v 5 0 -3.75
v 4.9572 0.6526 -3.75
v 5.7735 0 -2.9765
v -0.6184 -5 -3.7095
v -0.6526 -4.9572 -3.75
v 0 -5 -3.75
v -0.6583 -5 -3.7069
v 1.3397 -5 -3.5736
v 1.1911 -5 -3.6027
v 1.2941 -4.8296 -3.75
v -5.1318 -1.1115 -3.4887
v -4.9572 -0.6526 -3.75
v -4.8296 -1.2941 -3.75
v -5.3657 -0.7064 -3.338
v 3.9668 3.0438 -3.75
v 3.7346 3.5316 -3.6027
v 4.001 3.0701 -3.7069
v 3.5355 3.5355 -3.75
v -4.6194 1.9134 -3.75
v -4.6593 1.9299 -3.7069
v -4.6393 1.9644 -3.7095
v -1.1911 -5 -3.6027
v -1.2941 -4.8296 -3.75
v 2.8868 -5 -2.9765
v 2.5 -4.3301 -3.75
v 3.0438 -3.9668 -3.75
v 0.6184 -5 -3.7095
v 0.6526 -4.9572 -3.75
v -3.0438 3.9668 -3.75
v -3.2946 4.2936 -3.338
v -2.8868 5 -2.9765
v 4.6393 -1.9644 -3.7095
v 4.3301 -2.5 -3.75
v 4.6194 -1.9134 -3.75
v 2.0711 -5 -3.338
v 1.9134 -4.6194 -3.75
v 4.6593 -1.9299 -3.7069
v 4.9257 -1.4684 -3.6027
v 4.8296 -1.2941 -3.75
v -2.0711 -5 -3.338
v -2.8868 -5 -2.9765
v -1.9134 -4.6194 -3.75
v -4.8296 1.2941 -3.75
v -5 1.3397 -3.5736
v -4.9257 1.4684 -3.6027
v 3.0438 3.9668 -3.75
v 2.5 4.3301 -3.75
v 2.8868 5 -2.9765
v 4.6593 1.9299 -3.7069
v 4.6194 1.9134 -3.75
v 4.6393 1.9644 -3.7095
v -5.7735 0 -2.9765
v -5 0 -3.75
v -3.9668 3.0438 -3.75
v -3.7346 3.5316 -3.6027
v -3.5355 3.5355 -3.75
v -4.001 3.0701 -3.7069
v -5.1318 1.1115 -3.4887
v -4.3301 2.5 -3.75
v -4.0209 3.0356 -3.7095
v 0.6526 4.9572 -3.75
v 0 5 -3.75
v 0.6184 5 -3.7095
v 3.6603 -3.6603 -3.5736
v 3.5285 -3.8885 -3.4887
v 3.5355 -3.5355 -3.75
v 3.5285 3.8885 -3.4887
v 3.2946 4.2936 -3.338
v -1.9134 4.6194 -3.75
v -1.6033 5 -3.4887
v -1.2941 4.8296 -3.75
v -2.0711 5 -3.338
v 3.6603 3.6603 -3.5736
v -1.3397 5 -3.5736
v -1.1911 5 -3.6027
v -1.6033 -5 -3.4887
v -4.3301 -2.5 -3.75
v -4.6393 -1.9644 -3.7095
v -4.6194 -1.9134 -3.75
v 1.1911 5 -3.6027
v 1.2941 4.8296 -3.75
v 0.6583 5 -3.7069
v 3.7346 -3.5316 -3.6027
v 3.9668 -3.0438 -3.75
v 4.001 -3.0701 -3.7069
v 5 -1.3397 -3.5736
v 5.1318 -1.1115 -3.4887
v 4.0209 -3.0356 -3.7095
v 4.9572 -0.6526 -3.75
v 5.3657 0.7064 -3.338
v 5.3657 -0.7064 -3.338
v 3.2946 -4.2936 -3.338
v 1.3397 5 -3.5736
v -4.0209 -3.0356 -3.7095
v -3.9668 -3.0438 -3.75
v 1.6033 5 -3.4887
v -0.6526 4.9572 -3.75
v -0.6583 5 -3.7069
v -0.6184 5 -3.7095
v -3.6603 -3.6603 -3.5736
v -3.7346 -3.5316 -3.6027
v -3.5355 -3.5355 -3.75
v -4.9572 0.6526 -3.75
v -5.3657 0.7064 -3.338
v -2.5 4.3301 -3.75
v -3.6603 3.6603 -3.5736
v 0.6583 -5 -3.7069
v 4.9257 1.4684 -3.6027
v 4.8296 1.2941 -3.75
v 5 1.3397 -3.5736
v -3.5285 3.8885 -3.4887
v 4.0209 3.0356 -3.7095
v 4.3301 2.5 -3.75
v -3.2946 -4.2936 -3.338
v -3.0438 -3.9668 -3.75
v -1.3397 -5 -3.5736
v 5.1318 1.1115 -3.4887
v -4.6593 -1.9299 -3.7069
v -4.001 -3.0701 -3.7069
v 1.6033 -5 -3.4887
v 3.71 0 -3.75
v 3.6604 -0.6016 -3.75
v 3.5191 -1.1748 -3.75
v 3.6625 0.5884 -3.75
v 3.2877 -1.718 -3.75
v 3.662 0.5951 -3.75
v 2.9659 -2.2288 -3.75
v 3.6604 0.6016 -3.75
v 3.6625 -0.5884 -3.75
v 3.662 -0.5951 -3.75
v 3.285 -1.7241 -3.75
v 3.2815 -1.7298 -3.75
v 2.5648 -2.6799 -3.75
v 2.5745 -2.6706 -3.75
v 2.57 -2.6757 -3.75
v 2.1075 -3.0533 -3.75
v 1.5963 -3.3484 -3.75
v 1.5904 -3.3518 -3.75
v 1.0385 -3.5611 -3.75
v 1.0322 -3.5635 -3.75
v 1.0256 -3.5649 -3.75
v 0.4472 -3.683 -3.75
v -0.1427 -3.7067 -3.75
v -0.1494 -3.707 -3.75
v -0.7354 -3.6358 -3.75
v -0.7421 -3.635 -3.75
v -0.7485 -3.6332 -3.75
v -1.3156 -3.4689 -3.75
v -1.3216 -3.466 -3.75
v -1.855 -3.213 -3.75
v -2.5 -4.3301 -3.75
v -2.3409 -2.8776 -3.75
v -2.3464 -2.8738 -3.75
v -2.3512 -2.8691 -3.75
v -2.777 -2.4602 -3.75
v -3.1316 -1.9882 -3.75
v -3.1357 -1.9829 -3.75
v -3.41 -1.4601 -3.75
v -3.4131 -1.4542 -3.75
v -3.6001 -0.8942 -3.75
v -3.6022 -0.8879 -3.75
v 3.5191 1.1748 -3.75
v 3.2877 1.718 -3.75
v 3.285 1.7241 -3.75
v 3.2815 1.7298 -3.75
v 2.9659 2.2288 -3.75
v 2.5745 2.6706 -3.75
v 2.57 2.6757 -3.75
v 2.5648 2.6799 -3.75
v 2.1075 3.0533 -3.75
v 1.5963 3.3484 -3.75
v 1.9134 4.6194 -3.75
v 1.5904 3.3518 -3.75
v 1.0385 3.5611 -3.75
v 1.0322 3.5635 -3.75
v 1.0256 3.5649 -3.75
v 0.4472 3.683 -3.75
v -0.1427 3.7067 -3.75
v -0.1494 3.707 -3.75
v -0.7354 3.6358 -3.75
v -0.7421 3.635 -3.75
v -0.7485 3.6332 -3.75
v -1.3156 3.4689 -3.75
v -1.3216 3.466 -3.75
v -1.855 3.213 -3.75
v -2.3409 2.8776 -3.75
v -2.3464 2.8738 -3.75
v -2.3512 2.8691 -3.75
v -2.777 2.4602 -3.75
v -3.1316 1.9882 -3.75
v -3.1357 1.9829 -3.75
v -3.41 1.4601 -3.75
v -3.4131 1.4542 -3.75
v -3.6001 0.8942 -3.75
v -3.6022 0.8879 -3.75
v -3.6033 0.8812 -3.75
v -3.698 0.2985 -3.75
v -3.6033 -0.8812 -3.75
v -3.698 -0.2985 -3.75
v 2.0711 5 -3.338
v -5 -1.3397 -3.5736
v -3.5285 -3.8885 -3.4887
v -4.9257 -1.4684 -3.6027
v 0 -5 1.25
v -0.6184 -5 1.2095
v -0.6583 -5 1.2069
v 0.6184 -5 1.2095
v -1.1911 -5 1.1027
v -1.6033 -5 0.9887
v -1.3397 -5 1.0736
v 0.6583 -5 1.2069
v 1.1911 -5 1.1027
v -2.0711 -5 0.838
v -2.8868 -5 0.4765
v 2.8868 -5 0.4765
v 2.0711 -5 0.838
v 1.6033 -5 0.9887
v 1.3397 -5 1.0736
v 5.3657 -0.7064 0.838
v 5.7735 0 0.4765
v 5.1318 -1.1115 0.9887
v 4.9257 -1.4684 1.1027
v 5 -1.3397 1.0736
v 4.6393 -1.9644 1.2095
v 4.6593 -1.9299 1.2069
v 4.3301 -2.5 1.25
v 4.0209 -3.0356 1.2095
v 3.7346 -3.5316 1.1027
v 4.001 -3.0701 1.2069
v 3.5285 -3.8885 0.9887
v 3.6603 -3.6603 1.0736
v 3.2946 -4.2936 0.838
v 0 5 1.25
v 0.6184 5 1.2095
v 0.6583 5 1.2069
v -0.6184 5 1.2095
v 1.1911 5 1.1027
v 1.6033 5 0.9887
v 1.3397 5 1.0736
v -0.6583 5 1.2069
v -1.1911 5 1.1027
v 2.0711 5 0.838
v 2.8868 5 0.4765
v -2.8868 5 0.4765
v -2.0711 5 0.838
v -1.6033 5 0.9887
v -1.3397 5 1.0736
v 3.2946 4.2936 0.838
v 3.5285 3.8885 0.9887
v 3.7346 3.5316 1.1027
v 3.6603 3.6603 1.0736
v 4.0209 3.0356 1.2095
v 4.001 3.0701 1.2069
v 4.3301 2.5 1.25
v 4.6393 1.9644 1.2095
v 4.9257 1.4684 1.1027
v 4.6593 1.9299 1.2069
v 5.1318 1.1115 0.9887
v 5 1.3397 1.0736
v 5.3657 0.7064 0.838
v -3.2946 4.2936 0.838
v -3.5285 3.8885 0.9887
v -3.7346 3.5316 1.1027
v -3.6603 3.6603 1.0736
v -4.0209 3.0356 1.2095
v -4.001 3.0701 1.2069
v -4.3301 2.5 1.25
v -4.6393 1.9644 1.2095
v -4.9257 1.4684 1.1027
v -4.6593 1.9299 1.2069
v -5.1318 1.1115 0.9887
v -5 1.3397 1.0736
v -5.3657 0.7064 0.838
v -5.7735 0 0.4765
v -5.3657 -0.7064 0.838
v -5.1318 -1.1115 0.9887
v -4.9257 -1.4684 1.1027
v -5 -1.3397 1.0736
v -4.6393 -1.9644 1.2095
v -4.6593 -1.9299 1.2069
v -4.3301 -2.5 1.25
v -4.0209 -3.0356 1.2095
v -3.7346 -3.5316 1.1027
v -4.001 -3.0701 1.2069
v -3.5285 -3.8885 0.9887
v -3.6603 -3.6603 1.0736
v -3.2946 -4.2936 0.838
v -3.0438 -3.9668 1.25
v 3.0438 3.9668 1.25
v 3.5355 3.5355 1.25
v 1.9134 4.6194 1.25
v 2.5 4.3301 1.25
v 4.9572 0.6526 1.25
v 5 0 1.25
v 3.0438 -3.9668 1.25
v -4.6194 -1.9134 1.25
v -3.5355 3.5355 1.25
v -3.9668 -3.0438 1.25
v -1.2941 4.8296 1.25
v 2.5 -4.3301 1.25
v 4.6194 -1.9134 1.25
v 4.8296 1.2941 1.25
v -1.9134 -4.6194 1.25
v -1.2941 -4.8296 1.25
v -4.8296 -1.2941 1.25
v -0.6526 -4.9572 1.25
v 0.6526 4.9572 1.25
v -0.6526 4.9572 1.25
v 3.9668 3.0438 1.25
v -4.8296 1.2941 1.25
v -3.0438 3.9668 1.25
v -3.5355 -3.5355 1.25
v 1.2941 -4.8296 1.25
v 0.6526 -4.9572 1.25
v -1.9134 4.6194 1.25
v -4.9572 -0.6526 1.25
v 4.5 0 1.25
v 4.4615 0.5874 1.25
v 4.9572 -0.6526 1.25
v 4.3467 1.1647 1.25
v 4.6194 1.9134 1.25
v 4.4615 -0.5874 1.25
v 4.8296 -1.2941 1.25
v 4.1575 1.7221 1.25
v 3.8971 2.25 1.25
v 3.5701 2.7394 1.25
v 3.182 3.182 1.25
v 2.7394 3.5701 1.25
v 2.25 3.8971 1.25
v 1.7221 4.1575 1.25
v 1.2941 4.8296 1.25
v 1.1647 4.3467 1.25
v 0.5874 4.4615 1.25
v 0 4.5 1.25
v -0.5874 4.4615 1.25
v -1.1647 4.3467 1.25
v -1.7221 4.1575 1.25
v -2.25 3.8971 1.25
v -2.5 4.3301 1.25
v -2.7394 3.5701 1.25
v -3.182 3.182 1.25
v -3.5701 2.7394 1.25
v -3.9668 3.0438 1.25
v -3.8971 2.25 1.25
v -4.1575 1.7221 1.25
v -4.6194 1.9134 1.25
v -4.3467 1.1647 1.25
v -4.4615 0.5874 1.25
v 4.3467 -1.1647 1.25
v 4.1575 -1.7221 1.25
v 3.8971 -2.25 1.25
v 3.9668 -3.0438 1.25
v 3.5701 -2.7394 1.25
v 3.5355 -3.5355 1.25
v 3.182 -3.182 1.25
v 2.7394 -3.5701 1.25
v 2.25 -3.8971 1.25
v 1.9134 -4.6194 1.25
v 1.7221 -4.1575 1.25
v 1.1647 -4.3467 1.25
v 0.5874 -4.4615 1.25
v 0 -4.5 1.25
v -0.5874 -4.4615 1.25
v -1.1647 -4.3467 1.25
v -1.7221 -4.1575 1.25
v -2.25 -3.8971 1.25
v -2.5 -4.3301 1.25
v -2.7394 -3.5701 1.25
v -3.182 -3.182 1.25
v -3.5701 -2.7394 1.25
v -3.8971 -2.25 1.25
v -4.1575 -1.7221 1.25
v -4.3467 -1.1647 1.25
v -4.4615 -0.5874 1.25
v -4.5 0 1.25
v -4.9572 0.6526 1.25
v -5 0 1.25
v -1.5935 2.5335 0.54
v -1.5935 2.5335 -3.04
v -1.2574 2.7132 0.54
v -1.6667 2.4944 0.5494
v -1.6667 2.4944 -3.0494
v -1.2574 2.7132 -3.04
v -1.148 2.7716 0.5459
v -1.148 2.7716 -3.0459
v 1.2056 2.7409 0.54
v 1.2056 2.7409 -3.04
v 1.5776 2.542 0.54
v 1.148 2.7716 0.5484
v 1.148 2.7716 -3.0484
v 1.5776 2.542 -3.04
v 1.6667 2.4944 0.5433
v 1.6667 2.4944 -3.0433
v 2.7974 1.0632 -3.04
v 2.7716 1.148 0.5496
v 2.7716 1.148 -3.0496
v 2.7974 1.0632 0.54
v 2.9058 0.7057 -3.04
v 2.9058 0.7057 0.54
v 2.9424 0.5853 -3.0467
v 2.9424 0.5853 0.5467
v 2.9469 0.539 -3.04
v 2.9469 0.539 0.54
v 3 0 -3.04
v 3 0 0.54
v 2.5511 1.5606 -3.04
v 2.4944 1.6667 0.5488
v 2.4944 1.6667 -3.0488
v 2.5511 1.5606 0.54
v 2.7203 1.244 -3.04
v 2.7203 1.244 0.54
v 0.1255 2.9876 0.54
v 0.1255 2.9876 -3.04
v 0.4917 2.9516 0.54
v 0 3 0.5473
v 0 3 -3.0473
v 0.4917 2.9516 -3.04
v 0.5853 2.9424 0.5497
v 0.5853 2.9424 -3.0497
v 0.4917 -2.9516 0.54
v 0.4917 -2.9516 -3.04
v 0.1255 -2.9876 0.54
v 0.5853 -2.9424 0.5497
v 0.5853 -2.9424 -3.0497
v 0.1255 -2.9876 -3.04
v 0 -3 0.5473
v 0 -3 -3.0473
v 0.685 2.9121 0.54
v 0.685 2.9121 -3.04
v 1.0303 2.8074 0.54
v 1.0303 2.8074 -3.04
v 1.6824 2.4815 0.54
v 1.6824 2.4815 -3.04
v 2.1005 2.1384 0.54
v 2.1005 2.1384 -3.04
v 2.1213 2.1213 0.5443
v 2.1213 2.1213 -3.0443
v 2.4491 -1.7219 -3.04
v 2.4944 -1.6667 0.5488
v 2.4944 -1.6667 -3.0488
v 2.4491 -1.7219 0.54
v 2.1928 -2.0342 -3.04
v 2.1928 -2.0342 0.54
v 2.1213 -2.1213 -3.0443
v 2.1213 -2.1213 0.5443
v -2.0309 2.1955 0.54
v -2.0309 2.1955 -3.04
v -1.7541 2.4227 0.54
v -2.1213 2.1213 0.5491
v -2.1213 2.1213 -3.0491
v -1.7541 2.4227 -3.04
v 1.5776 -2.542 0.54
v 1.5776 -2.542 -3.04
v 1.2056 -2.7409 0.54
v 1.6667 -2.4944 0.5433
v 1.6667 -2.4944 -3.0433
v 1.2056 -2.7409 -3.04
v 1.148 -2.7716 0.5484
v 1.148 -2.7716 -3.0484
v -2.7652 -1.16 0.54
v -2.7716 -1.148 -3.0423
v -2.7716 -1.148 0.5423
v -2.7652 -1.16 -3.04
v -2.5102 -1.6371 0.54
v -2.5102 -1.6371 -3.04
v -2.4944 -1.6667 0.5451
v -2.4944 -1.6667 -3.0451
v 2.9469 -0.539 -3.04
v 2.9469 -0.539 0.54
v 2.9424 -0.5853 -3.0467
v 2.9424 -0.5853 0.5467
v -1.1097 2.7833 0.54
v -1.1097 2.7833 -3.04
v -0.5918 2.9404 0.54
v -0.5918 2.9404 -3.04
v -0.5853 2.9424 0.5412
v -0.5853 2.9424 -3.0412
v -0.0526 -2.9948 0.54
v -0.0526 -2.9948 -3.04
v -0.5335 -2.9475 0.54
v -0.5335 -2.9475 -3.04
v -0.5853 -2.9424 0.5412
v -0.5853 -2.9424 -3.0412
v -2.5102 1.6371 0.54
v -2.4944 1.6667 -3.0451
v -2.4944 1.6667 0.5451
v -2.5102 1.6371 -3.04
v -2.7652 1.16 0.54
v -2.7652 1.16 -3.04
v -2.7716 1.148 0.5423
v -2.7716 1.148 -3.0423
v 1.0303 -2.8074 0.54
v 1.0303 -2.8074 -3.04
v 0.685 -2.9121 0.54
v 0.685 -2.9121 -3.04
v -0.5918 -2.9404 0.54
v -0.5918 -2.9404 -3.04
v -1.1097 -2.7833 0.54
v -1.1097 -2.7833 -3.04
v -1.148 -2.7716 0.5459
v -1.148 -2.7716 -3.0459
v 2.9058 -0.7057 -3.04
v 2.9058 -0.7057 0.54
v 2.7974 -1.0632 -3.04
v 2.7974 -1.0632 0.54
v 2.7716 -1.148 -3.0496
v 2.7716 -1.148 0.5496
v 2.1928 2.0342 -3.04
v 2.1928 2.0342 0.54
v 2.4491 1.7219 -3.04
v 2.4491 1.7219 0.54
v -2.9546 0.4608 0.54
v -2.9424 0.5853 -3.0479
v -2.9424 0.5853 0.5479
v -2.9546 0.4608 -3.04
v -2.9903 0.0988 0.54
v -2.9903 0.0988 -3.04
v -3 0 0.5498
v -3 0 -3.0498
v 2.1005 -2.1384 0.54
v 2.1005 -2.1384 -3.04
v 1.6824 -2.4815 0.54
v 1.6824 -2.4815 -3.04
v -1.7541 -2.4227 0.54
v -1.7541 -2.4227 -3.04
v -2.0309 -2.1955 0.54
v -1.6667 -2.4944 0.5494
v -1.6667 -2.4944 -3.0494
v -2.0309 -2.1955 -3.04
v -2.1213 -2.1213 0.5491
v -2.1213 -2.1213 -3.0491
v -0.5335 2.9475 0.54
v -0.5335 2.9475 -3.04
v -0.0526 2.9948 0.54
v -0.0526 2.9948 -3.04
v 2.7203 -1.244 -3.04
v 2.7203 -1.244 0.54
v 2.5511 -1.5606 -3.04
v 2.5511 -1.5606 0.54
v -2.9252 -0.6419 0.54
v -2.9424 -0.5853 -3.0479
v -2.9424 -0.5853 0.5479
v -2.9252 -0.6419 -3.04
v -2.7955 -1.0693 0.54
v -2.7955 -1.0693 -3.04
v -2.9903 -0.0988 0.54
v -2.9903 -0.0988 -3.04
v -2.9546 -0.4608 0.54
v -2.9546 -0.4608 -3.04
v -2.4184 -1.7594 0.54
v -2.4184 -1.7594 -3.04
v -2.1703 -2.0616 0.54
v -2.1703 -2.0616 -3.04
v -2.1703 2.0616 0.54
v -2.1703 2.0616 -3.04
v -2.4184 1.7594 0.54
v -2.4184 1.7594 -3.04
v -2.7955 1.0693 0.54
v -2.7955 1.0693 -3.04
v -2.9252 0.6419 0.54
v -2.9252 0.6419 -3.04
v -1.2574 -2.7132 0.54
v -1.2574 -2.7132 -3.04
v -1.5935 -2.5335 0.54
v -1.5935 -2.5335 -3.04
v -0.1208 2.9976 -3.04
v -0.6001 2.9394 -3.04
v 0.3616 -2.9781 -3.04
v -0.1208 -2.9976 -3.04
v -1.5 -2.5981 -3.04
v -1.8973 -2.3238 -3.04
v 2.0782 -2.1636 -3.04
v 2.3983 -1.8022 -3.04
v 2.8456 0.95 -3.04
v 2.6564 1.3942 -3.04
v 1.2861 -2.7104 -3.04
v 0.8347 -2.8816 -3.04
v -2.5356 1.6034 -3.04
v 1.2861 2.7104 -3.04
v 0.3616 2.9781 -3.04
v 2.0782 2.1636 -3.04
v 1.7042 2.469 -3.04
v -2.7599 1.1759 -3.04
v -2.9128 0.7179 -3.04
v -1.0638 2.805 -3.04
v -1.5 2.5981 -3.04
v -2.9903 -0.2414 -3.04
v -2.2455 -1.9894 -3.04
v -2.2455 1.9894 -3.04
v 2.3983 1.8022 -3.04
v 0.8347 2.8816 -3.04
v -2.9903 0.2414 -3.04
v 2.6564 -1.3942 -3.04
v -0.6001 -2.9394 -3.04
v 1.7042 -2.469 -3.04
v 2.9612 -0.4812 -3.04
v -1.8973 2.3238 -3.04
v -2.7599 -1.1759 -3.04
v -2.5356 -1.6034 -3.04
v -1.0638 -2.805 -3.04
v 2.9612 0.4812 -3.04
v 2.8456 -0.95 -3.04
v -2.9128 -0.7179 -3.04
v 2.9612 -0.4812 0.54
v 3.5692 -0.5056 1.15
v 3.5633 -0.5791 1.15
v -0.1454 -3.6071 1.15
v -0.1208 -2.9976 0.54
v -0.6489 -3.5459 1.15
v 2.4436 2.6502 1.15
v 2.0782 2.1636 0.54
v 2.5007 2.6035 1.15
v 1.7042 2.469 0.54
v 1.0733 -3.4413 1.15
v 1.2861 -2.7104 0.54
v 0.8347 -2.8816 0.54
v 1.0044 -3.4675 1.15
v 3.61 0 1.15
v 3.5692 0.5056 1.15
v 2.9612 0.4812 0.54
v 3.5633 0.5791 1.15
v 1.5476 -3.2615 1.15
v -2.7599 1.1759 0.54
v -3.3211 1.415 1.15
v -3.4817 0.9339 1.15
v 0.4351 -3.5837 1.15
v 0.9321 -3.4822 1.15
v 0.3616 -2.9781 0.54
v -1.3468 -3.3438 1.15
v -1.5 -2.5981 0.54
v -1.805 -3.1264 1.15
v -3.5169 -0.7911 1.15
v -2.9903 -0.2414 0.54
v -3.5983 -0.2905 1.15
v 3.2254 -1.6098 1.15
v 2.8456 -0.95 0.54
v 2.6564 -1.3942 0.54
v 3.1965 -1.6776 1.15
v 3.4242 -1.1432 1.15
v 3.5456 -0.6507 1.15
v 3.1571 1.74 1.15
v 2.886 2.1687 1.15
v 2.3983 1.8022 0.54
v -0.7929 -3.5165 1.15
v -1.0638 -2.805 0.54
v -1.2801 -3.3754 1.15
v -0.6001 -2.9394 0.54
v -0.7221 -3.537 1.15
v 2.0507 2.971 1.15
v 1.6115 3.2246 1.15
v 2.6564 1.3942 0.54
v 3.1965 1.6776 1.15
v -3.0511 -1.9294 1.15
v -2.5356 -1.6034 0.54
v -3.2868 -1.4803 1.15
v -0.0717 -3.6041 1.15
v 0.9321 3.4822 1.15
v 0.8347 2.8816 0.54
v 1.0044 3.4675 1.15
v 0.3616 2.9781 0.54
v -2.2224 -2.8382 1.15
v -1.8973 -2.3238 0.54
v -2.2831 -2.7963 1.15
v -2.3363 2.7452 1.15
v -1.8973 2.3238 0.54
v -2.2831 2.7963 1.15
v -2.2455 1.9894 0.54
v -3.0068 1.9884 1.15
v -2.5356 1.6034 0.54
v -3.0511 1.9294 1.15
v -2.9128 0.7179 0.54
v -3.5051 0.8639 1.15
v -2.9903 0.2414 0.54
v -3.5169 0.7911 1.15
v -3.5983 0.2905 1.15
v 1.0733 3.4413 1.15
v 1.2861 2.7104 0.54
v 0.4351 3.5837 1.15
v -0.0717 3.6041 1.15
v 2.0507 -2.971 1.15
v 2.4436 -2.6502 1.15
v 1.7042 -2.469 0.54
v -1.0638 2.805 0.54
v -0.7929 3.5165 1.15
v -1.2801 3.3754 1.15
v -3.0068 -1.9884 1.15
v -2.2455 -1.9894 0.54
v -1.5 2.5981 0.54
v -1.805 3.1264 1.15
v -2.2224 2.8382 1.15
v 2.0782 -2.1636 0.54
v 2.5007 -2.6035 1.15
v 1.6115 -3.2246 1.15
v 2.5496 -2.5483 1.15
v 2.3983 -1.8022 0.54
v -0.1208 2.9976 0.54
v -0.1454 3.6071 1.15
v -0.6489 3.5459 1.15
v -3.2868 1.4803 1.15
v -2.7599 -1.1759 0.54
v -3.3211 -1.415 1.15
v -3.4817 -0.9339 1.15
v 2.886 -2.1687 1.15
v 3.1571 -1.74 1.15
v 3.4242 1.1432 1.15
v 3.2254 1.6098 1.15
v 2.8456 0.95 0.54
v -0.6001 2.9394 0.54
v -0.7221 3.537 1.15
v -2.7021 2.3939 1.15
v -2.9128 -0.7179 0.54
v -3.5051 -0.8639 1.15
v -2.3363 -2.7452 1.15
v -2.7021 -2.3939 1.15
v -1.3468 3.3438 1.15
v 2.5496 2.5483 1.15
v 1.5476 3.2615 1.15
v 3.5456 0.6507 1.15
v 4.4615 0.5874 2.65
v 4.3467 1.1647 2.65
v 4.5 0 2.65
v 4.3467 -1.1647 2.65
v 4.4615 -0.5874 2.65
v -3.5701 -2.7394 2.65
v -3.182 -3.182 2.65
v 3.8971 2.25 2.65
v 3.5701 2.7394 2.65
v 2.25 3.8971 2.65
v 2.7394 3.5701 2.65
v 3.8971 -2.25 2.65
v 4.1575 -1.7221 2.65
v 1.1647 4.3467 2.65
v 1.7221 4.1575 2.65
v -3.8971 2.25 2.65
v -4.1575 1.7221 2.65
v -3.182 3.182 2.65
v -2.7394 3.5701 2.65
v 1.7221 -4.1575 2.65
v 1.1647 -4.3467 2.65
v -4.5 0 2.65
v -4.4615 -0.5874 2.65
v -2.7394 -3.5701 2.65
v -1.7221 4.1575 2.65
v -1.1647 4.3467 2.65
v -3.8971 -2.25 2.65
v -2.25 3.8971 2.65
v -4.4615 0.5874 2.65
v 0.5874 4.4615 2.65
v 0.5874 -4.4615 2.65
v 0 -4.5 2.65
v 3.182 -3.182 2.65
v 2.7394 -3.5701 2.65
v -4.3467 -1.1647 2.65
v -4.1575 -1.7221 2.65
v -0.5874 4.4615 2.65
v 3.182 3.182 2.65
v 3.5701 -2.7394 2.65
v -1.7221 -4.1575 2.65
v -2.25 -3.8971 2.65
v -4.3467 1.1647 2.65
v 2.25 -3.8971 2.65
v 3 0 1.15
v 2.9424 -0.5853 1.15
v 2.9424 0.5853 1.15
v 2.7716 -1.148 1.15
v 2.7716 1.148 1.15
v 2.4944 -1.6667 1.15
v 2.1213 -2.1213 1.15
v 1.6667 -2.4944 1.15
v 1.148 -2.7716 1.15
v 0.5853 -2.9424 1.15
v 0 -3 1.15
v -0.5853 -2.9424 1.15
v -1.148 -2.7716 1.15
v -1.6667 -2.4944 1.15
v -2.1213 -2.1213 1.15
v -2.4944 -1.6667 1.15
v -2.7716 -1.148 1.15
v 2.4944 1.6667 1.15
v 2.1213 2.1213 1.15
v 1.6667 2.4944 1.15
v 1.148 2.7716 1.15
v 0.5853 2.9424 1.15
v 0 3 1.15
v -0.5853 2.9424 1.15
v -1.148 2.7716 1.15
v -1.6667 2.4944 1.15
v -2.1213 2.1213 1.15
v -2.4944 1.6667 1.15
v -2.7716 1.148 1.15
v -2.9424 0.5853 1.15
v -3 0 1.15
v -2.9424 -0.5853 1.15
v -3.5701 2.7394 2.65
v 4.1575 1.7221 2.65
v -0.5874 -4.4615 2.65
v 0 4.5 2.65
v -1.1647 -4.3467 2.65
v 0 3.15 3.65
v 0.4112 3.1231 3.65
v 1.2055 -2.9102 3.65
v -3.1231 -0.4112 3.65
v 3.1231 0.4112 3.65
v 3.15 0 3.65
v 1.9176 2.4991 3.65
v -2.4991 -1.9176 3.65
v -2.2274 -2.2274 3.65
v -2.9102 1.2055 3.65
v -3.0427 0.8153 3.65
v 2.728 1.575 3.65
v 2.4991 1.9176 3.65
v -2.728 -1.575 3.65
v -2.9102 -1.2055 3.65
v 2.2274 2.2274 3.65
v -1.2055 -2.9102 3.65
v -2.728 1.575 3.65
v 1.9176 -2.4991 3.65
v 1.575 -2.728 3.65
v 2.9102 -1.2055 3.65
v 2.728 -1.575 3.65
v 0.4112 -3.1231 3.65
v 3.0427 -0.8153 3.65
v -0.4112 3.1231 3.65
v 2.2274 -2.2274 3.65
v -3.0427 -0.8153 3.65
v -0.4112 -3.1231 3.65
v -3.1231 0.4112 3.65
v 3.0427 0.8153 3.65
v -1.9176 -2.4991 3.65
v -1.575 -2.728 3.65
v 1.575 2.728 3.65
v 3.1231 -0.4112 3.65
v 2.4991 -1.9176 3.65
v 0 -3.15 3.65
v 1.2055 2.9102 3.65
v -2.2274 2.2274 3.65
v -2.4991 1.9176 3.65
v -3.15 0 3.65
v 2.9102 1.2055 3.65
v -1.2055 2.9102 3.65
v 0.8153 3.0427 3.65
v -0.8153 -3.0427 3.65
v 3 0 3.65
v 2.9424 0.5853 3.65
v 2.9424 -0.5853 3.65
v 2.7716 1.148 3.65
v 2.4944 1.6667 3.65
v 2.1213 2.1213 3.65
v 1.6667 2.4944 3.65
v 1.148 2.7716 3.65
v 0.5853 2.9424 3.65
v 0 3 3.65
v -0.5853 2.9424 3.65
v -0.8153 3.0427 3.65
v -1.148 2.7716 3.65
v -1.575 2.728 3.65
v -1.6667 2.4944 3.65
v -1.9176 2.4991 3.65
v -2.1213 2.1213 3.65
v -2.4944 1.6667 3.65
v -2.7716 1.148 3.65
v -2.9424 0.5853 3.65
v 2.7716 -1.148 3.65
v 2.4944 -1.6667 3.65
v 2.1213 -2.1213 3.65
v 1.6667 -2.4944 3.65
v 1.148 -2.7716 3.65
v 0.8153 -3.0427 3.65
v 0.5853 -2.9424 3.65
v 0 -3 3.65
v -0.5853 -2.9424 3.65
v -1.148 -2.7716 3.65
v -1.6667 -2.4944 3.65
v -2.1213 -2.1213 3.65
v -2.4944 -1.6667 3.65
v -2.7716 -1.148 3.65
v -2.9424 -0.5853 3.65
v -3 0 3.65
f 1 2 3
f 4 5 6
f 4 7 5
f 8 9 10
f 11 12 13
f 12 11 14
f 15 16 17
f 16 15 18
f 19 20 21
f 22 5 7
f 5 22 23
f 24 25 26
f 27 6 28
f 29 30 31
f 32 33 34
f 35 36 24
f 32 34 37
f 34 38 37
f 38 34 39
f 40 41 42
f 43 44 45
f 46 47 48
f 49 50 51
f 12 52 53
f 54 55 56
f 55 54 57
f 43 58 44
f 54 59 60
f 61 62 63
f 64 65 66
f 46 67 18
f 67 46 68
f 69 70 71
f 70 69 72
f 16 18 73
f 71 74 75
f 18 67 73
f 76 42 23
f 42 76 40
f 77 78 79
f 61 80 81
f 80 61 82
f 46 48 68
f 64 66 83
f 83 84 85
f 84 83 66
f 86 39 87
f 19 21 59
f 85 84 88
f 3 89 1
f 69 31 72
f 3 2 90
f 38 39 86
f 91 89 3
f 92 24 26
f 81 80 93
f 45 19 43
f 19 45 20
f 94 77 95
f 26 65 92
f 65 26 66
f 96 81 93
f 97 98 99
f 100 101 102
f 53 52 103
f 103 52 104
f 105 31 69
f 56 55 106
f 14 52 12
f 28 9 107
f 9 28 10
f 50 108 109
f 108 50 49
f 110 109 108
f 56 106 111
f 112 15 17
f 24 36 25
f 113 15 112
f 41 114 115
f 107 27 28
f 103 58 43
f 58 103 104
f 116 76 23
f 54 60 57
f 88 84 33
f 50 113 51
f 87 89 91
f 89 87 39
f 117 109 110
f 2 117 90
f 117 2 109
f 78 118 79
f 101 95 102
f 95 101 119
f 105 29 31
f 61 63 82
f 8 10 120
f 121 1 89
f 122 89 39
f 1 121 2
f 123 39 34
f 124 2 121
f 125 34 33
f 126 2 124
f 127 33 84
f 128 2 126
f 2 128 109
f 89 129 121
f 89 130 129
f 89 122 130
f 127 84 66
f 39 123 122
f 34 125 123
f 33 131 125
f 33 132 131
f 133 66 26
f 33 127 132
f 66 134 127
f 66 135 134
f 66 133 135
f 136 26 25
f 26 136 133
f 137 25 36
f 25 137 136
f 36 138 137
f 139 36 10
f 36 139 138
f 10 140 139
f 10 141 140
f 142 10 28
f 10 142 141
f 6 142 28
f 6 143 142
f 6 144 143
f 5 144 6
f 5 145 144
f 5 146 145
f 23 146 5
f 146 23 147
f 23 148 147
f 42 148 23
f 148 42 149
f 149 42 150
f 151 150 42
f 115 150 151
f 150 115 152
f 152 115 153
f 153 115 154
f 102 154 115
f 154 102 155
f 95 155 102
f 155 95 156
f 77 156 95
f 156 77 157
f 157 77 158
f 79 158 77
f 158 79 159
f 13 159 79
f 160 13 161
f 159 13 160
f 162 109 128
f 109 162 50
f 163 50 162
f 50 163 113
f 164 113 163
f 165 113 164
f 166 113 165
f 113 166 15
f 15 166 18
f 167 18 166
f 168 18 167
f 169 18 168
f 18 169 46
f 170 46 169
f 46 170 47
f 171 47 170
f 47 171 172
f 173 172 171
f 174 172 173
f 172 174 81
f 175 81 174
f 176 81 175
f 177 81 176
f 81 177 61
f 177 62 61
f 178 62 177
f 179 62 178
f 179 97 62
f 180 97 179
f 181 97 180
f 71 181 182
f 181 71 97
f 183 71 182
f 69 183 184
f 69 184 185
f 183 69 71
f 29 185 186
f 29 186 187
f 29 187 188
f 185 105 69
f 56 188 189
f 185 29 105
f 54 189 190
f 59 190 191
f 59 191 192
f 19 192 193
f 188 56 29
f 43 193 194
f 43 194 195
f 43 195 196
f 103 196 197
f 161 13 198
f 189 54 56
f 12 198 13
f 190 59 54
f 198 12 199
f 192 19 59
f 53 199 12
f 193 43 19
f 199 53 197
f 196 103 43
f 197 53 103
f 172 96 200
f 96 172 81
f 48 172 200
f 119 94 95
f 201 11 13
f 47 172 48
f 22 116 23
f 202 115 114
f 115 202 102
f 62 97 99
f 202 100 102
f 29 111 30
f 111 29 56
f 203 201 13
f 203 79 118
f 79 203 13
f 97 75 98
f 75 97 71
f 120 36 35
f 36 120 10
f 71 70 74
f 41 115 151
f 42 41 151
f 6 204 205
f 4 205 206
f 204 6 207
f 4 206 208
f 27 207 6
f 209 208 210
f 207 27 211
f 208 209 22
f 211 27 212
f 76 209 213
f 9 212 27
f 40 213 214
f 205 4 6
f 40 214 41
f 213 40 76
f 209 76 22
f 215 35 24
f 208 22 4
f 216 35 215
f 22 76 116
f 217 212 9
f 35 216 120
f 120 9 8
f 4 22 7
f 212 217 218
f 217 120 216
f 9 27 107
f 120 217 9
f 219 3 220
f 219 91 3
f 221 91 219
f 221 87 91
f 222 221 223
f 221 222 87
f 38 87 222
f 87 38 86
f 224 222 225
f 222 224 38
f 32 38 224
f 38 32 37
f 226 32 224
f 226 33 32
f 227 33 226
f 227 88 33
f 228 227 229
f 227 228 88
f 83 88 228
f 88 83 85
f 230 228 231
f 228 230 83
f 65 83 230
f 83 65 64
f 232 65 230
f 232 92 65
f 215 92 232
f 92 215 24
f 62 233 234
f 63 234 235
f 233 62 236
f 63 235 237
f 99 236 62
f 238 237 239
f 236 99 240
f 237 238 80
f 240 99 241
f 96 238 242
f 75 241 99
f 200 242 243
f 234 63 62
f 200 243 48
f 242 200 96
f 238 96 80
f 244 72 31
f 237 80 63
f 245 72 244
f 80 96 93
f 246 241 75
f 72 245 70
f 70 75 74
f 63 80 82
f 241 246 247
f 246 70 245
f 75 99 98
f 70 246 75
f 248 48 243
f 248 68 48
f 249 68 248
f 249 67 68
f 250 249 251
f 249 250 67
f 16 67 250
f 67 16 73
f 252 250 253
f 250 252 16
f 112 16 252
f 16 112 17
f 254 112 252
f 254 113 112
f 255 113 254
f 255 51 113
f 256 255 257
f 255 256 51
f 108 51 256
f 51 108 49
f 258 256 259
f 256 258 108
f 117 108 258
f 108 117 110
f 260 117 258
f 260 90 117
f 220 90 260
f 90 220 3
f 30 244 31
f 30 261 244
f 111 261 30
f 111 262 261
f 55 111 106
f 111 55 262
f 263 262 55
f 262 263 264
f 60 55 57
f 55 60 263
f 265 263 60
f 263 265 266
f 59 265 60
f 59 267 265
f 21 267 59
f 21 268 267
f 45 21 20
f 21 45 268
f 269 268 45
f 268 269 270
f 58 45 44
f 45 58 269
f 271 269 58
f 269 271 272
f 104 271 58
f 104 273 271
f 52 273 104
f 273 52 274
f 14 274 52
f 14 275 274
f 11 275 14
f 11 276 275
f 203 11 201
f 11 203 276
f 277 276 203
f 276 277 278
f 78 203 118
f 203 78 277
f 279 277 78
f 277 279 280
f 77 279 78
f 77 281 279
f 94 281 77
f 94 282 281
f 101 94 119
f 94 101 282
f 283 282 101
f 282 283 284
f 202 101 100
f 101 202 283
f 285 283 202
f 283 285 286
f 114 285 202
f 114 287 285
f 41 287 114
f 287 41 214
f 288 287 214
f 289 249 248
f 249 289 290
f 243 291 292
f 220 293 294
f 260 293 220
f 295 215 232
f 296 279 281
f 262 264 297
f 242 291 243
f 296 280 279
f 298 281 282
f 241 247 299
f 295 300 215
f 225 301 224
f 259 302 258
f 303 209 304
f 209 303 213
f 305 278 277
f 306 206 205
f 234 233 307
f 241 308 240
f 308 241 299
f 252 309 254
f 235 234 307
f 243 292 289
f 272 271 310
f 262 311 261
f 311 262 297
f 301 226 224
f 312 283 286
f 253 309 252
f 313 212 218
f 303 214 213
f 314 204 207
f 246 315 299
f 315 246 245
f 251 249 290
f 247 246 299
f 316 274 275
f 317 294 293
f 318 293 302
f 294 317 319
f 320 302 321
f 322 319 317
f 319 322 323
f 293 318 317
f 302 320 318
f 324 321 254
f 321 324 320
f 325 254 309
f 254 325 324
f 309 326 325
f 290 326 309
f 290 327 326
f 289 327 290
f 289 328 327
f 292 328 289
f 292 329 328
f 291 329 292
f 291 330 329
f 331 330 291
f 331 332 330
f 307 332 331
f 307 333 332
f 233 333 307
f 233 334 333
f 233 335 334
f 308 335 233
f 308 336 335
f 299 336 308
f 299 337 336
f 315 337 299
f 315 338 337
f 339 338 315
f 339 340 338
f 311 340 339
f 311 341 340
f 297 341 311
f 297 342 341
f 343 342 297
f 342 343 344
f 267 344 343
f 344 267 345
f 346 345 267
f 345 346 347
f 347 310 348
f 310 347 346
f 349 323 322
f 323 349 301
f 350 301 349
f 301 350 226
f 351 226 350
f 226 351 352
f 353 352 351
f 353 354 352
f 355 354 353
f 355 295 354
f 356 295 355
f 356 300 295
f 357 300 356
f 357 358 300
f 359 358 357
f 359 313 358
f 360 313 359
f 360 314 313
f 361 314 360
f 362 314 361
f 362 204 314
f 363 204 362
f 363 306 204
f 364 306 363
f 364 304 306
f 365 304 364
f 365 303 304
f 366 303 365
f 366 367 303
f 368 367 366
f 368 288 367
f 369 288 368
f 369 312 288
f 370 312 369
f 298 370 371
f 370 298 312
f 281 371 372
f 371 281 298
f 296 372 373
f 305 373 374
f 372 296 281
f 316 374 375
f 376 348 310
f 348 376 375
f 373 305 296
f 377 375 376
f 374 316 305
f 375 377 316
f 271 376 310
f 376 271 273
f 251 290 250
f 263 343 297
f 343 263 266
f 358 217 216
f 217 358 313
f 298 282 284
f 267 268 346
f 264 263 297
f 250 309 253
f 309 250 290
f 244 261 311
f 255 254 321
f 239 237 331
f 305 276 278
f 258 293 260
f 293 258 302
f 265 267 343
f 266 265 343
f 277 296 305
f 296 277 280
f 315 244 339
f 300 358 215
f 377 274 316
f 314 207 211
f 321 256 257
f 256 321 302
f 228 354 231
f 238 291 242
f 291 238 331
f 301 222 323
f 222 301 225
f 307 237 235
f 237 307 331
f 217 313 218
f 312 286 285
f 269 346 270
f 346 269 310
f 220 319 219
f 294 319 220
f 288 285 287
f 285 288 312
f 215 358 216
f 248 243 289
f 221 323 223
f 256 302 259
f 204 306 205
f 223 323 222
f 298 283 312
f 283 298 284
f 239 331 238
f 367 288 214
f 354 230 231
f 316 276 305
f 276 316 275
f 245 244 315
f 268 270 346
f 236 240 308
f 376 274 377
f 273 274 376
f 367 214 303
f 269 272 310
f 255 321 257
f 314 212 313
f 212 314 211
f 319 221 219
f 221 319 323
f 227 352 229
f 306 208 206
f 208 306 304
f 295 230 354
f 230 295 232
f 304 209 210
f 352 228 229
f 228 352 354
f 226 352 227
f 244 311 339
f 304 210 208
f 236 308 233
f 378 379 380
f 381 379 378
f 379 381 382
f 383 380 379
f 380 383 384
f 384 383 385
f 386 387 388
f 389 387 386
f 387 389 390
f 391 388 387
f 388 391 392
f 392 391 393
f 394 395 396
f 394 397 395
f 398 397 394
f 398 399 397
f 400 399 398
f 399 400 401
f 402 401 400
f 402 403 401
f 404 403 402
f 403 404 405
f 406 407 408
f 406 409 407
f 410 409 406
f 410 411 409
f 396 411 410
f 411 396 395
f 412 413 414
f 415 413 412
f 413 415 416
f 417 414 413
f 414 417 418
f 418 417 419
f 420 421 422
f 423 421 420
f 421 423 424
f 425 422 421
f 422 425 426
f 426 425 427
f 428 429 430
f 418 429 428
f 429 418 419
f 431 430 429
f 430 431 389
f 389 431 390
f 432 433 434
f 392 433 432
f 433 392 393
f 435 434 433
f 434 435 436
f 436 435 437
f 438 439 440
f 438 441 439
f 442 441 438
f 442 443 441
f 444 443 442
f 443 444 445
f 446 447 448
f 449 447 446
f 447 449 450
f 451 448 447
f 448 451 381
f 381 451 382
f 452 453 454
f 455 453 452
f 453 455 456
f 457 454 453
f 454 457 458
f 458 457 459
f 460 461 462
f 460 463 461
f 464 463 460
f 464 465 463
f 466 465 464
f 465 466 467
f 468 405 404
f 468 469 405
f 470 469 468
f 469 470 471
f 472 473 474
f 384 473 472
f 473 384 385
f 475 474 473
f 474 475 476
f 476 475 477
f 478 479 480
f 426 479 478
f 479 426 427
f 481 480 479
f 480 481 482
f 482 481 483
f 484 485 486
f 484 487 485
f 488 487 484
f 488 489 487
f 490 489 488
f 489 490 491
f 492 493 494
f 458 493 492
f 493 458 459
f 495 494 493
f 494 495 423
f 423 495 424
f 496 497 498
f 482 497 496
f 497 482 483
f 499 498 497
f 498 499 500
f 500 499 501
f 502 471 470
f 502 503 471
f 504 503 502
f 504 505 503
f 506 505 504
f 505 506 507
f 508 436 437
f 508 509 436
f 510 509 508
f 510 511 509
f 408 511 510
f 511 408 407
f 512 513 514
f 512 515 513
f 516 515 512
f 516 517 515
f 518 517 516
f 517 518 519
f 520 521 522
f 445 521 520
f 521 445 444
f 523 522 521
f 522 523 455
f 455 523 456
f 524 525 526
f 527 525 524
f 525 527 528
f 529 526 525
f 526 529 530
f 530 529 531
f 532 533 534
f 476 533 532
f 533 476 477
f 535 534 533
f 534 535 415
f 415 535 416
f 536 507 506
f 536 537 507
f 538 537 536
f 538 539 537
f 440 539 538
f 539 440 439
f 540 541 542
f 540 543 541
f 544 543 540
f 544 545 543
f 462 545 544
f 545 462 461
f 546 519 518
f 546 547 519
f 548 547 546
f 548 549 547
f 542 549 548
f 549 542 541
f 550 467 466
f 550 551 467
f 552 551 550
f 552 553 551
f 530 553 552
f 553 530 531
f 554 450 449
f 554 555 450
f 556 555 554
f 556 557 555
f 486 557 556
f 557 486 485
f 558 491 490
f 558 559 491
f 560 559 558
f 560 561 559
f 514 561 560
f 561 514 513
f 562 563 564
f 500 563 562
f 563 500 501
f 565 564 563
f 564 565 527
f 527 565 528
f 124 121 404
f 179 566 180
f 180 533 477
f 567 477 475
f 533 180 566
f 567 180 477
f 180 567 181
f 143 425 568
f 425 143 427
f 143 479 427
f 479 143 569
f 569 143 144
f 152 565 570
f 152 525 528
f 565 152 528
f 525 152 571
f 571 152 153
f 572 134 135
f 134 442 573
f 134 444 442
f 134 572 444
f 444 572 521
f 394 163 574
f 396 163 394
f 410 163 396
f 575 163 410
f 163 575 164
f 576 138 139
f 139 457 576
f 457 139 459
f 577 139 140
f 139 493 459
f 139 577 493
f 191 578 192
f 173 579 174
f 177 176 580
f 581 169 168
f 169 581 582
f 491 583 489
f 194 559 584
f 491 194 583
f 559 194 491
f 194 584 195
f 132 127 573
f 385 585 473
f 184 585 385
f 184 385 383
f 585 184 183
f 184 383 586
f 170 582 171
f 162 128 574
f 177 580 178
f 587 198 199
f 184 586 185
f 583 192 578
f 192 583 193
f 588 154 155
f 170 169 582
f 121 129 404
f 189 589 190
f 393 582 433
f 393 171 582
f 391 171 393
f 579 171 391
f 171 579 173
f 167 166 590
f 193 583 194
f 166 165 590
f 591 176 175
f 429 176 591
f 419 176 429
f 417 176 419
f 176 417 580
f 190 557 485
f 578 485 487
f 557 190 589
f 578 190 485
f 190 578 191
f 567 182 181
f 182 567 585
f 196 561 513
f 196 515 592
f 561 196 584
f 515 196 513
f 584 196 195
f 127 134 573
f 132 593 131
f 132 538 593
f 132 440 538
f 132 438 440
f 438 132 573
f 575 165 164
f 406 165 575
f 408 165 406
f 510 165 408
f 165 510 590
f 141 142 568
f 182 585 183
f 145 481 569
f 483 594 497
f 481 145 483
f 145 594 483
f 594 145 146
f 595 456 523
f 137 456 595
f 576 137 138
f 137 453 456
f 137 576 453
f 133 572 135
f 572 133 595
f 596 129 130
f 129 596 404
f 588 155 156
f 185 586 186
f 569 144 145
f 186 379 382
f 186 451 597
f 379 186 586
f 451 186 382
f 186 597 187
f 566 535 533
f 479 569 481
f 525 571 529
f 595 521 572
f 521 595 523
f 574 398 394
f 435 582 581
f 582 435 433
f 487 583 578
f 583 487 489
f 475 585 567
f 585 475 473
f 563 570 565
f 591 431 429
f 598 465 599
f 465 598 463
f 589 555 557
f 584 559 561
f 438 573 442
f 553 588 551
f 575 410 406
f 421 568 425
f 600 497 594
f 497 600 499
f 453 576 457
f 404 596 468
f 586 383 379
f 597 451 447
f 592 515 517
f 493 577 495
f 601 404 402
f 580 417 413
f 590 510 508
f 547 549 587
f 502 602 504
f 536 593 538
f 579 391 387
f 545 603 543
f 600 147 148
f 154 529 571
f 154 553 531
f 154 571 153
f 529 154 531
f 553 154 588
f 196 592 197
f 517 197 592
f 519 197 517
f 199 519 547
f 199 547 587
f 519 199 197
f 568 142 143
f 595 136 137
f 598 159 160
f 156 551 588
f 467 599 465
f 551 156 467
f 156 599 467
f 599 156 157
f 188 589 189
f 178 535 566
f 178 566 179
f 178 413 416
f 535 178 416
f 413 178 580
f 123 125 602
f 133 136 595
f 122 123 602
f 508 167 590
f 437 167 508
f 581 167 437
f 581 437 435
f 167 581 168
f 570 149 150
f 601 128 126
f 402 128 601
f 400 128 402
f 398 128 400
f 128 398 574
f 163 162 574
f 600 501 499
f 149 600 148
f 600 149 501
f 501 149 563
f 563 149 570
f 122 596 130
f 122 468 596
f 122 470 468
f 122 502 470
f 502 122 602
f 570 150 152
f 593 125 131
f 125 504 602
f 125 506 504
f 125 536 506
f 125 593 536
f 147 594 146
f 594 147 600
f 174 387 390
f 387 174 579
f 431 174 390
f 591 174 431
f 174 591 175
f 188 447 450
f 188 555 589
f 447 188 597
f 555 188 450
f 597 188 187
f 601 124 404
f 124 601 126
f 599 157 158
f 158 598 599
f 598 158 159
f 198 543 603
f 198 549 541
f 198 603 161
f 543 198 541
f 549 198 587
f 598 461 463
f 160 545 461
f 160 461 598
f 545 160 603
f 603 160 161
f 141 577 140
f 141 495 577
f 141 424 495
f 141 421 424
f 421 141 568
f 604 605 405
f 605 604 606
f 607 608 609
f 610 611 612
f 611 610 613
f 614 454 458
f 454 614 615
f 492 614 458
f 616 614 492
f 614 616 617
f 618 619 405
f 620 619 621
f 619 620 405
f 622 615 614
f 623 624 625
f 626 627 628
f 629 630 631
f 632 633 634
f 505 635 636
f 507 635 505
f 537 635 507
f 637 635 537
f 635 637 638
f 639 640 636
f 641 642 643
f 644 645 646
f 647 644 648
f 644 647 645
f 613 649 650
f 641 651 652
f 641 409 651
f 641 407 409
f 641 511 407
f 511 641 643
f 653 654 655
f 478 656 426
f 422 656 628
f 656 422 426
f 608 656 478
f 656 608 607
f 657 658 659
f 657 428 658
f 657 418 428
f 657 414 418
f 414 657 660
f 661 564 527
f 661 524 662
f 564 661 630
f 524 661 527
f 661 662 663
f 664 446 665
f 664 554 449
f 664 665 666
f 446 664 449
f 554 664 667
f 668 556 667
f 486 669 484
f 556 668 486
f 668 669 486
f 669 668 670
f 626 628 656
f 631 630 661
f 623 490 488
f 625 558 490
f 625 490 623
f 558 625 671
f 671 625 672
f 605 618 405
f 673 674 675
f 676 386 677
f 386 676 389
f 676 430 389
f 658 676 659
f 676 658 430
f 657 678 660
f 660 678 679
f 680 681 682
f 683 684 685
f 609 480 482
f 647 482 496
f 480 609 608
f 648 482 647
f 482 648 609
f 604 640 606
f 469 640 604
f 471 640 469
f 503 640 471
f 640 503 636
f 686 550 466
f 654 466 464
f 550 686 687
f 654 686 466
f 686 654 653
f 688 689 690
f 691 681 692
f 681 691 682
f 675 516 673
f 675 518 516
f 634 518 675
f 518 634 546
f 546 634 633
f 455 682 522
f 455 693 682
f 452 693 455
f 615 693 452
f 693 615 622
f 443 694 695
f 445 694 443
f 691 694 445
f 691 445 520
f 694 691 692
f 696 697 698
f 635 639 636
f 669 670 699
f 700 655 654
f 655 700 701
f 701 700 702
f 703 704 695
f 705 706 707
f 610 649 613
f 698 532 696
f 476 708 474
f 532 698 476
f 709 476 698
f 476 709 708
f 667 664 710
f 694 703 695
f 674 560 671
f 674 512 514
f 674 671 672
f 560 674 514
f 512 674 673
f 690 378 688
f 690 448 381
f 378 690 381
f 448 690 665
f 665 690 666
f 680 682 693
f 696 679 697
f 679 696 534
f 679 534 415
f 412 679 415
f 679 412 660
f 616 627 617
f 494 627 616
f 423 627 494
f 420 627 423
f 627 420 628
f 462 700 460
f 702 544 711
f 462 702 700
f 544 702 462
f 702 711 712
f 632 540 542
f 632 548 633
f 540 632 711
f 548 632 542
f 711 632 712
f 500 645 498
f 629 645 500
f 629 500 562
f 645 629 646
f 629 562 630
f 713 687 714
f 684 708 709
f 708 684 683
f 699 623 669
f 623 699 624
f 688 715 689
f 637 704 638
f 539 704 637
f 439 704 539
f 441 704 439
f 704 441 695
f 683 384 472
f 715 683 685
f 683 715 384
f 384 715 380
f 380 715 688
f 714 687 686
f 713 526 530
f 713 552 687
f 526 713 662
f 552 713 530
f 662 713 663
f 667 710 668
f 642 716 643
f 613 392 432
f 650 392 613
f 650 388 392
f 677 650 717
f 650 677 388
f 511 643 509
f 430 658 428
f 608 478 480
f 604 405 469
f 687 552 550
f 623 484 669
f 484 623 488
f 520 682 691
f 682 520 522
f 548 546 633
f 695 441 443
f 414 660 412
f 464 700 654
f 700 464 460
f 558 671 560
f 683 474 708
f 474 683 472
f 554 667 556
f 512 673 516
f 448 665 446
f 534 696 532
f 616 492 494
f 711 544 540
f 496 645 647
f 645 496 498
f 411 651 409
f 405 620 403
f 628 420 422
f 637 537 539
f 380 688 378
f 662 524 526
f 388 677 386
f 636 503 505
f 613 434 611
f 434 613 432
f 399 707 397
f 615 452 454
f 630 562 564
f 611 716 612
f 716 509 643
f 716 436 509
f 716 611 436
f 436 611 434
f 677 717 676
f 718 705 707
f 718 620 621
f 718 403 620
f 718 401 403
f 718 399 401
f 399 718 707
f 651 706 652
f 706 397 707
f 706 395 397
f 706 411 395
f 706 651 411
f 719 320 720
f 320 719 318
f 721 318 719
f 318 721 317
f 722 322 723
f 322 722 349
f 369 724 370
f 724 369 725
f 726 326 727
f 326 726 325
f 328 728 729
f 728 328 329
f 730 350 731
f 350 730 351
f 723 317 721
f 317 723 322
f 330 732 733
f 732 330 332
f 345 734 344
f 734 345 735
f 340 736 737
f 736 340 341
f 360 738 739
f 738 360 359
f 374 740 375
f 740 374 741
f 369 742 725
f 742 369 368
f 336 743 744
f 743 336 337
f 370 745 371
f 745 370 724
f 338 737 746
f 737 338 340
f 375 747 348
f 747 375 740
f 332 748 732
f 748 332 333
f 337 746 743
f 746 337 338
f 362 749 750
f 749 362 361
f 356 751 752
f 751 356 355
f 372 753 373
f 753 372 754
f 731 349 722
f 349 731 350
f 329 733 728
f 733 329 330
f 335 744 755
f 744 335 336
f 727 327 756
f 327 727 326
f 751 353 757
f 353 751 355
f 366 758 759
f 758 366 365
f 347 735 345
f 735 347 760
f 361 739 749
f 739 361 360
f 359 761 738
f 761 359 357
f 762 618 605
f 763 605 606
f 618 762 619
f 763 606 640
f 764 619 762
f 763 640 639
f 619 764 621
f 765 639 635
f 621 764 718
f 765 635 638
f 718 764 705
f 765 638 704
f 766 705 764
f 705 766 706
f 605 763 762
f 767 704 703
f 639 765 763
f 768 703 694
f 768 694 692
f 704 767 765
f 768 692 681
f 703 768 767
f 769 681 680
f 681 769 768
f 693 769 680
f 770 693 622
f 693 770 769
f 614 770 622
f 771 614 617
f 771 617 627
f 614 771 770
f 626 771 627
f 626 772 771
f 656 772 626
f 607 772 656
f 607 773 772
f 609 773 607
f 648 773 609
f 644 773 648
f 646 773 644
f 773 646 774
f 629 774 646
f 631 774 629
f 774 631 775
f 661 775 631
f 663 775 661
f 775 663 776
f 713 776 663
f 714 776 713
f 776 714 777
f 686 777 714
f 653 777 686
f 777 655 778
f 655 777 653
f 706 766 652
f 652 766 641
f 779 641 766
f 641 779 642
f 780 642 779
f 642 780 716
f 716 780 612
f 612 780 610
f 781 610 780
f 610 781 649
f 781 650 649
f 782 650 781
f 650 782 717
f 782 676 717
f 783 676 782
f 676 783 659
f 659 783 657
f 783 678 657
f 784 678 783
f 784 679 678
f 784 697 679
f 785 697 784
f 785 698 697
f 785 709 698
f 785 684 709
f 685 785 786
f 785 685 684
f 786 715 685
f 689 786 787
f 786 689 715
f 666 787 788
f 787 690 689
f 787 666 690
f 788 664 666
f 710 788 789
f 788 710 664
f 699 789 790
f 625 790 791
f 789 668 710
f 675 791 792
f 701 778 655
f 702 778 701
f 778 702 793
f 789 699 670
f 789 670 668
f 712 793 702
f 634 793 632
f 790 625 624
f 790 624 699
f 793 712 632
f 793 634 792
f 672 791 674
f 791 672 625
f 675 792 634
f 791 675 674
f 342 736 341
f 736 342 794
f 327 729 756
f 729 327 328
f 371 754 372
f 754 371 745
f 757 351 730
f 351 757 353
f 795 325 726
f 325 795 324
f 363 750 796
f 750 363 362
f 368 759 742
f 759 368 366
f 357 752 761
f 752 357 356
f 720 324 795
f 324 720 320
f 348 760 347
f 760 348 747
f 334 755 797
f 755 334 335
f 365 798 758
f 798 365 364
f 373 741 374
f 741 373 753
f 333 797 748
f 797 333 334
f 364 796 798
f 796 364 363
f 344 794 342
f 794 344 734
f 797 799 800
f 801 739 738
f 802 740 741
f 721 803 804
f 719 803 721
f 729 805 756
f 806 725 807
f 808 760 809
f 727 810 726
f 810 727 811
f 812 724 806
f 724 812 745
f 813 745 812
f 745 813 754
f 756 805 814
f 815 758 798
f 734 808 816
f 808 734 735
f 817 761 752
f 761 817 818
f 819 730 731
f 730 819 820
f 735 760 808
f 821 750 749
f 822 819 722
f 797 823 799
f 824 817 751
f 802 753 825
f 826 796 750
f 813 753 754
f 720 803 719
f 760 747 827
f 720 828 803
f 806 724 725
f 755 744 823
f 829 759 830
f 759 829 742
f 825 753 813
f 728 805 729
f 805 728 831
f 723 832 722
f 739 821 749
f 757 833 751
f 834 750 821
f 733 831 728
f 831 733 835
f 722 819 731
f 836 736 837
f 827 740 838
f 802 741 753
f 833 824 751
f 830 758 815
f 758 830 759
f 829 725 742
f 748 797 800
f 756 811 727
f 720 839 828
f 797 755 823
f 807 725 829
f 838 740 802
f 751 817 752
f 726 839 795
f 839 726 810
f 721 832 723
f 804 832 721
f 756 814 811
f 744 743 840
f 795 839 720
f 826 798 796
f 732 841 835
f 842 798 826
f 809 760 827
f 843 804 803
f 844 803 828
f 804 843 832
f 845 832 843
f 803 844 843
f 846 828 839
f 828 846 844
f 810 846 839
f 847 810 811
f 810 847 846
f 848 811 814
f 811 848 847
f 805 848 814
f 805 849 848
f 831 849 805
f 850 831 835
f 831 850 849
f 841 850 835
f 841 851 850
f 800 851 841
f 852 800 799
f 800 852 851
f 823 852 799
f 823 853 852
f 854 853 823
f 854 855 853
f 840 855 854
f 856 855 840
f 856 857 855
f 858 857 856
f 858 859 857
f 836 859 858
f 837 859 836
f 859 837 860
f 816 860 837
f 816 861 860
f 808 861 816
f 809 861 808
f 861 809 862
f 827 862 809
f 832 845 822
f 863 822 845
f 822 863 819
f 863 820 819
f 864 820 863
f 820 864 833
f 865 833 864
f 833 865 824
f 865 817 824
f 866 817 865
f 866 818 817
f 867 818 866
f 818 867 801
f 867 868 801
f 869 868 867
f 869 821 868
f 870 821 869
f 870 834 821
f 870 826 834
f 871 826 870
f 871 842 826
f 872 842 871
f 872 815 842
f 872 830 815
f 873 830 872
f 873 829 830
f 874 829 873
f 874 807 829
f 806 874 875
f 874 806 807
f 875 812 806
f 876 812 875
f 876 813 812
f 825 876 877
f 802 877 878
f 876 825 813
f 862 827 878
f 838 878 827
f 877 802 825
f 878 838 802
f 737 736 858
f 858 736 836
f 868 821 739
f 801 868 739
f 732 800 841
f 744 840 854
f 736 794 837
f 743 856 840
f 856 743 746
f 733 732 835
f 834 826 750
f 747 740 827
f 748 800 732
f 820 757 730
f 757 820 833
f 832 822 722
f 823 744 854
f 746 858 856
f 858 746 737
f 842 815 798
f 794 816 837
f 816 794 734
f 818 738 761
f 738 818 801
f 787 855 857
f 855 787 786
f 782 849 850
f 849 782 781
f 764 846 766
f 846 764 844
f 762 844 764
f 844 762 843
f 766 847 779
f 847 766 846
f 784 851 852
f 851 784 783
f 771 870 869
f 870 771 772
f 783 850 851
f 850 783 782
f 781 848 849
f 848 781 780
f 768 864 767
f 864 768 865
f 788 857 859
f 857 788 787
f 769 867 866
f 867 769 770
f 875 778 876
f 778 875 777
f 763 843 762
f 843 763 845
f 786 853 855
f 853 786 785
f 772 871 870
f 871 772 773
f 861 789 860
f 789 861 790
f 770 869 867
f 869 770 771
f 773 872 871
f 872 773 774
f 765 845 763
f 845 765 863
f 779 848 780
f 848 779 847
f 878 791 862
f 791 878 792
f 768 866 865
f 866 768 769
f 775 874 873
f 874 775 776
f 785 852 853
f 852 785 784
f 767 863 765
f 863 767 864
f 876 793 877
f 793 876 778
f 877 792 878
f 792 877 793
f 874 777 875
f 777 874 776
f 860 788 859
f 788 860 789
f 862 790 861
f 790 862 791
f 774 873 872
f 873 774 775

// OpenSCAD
use <common.scad>

// 용어:
// 1. 풀림방지 너트(lock nut)
// 2. 대변거리(across flat)
// 3. 관통 구멍(bore)
// 4. 너트 높이(nut thickness)

function lock_nut_m6_t() = 5;   // M6 풀림방지 너트(lock nut)의 너트 높이(nut thickness), mm

module lock_nut_m6(part_color = [0.74, 0.41, 0]) {
    lock_nut(across_flat = 10,
             thickness = lock_nut_m6_t(),
             bore = 6,
             part_color = part_color);
}

lock_nut_m6();
